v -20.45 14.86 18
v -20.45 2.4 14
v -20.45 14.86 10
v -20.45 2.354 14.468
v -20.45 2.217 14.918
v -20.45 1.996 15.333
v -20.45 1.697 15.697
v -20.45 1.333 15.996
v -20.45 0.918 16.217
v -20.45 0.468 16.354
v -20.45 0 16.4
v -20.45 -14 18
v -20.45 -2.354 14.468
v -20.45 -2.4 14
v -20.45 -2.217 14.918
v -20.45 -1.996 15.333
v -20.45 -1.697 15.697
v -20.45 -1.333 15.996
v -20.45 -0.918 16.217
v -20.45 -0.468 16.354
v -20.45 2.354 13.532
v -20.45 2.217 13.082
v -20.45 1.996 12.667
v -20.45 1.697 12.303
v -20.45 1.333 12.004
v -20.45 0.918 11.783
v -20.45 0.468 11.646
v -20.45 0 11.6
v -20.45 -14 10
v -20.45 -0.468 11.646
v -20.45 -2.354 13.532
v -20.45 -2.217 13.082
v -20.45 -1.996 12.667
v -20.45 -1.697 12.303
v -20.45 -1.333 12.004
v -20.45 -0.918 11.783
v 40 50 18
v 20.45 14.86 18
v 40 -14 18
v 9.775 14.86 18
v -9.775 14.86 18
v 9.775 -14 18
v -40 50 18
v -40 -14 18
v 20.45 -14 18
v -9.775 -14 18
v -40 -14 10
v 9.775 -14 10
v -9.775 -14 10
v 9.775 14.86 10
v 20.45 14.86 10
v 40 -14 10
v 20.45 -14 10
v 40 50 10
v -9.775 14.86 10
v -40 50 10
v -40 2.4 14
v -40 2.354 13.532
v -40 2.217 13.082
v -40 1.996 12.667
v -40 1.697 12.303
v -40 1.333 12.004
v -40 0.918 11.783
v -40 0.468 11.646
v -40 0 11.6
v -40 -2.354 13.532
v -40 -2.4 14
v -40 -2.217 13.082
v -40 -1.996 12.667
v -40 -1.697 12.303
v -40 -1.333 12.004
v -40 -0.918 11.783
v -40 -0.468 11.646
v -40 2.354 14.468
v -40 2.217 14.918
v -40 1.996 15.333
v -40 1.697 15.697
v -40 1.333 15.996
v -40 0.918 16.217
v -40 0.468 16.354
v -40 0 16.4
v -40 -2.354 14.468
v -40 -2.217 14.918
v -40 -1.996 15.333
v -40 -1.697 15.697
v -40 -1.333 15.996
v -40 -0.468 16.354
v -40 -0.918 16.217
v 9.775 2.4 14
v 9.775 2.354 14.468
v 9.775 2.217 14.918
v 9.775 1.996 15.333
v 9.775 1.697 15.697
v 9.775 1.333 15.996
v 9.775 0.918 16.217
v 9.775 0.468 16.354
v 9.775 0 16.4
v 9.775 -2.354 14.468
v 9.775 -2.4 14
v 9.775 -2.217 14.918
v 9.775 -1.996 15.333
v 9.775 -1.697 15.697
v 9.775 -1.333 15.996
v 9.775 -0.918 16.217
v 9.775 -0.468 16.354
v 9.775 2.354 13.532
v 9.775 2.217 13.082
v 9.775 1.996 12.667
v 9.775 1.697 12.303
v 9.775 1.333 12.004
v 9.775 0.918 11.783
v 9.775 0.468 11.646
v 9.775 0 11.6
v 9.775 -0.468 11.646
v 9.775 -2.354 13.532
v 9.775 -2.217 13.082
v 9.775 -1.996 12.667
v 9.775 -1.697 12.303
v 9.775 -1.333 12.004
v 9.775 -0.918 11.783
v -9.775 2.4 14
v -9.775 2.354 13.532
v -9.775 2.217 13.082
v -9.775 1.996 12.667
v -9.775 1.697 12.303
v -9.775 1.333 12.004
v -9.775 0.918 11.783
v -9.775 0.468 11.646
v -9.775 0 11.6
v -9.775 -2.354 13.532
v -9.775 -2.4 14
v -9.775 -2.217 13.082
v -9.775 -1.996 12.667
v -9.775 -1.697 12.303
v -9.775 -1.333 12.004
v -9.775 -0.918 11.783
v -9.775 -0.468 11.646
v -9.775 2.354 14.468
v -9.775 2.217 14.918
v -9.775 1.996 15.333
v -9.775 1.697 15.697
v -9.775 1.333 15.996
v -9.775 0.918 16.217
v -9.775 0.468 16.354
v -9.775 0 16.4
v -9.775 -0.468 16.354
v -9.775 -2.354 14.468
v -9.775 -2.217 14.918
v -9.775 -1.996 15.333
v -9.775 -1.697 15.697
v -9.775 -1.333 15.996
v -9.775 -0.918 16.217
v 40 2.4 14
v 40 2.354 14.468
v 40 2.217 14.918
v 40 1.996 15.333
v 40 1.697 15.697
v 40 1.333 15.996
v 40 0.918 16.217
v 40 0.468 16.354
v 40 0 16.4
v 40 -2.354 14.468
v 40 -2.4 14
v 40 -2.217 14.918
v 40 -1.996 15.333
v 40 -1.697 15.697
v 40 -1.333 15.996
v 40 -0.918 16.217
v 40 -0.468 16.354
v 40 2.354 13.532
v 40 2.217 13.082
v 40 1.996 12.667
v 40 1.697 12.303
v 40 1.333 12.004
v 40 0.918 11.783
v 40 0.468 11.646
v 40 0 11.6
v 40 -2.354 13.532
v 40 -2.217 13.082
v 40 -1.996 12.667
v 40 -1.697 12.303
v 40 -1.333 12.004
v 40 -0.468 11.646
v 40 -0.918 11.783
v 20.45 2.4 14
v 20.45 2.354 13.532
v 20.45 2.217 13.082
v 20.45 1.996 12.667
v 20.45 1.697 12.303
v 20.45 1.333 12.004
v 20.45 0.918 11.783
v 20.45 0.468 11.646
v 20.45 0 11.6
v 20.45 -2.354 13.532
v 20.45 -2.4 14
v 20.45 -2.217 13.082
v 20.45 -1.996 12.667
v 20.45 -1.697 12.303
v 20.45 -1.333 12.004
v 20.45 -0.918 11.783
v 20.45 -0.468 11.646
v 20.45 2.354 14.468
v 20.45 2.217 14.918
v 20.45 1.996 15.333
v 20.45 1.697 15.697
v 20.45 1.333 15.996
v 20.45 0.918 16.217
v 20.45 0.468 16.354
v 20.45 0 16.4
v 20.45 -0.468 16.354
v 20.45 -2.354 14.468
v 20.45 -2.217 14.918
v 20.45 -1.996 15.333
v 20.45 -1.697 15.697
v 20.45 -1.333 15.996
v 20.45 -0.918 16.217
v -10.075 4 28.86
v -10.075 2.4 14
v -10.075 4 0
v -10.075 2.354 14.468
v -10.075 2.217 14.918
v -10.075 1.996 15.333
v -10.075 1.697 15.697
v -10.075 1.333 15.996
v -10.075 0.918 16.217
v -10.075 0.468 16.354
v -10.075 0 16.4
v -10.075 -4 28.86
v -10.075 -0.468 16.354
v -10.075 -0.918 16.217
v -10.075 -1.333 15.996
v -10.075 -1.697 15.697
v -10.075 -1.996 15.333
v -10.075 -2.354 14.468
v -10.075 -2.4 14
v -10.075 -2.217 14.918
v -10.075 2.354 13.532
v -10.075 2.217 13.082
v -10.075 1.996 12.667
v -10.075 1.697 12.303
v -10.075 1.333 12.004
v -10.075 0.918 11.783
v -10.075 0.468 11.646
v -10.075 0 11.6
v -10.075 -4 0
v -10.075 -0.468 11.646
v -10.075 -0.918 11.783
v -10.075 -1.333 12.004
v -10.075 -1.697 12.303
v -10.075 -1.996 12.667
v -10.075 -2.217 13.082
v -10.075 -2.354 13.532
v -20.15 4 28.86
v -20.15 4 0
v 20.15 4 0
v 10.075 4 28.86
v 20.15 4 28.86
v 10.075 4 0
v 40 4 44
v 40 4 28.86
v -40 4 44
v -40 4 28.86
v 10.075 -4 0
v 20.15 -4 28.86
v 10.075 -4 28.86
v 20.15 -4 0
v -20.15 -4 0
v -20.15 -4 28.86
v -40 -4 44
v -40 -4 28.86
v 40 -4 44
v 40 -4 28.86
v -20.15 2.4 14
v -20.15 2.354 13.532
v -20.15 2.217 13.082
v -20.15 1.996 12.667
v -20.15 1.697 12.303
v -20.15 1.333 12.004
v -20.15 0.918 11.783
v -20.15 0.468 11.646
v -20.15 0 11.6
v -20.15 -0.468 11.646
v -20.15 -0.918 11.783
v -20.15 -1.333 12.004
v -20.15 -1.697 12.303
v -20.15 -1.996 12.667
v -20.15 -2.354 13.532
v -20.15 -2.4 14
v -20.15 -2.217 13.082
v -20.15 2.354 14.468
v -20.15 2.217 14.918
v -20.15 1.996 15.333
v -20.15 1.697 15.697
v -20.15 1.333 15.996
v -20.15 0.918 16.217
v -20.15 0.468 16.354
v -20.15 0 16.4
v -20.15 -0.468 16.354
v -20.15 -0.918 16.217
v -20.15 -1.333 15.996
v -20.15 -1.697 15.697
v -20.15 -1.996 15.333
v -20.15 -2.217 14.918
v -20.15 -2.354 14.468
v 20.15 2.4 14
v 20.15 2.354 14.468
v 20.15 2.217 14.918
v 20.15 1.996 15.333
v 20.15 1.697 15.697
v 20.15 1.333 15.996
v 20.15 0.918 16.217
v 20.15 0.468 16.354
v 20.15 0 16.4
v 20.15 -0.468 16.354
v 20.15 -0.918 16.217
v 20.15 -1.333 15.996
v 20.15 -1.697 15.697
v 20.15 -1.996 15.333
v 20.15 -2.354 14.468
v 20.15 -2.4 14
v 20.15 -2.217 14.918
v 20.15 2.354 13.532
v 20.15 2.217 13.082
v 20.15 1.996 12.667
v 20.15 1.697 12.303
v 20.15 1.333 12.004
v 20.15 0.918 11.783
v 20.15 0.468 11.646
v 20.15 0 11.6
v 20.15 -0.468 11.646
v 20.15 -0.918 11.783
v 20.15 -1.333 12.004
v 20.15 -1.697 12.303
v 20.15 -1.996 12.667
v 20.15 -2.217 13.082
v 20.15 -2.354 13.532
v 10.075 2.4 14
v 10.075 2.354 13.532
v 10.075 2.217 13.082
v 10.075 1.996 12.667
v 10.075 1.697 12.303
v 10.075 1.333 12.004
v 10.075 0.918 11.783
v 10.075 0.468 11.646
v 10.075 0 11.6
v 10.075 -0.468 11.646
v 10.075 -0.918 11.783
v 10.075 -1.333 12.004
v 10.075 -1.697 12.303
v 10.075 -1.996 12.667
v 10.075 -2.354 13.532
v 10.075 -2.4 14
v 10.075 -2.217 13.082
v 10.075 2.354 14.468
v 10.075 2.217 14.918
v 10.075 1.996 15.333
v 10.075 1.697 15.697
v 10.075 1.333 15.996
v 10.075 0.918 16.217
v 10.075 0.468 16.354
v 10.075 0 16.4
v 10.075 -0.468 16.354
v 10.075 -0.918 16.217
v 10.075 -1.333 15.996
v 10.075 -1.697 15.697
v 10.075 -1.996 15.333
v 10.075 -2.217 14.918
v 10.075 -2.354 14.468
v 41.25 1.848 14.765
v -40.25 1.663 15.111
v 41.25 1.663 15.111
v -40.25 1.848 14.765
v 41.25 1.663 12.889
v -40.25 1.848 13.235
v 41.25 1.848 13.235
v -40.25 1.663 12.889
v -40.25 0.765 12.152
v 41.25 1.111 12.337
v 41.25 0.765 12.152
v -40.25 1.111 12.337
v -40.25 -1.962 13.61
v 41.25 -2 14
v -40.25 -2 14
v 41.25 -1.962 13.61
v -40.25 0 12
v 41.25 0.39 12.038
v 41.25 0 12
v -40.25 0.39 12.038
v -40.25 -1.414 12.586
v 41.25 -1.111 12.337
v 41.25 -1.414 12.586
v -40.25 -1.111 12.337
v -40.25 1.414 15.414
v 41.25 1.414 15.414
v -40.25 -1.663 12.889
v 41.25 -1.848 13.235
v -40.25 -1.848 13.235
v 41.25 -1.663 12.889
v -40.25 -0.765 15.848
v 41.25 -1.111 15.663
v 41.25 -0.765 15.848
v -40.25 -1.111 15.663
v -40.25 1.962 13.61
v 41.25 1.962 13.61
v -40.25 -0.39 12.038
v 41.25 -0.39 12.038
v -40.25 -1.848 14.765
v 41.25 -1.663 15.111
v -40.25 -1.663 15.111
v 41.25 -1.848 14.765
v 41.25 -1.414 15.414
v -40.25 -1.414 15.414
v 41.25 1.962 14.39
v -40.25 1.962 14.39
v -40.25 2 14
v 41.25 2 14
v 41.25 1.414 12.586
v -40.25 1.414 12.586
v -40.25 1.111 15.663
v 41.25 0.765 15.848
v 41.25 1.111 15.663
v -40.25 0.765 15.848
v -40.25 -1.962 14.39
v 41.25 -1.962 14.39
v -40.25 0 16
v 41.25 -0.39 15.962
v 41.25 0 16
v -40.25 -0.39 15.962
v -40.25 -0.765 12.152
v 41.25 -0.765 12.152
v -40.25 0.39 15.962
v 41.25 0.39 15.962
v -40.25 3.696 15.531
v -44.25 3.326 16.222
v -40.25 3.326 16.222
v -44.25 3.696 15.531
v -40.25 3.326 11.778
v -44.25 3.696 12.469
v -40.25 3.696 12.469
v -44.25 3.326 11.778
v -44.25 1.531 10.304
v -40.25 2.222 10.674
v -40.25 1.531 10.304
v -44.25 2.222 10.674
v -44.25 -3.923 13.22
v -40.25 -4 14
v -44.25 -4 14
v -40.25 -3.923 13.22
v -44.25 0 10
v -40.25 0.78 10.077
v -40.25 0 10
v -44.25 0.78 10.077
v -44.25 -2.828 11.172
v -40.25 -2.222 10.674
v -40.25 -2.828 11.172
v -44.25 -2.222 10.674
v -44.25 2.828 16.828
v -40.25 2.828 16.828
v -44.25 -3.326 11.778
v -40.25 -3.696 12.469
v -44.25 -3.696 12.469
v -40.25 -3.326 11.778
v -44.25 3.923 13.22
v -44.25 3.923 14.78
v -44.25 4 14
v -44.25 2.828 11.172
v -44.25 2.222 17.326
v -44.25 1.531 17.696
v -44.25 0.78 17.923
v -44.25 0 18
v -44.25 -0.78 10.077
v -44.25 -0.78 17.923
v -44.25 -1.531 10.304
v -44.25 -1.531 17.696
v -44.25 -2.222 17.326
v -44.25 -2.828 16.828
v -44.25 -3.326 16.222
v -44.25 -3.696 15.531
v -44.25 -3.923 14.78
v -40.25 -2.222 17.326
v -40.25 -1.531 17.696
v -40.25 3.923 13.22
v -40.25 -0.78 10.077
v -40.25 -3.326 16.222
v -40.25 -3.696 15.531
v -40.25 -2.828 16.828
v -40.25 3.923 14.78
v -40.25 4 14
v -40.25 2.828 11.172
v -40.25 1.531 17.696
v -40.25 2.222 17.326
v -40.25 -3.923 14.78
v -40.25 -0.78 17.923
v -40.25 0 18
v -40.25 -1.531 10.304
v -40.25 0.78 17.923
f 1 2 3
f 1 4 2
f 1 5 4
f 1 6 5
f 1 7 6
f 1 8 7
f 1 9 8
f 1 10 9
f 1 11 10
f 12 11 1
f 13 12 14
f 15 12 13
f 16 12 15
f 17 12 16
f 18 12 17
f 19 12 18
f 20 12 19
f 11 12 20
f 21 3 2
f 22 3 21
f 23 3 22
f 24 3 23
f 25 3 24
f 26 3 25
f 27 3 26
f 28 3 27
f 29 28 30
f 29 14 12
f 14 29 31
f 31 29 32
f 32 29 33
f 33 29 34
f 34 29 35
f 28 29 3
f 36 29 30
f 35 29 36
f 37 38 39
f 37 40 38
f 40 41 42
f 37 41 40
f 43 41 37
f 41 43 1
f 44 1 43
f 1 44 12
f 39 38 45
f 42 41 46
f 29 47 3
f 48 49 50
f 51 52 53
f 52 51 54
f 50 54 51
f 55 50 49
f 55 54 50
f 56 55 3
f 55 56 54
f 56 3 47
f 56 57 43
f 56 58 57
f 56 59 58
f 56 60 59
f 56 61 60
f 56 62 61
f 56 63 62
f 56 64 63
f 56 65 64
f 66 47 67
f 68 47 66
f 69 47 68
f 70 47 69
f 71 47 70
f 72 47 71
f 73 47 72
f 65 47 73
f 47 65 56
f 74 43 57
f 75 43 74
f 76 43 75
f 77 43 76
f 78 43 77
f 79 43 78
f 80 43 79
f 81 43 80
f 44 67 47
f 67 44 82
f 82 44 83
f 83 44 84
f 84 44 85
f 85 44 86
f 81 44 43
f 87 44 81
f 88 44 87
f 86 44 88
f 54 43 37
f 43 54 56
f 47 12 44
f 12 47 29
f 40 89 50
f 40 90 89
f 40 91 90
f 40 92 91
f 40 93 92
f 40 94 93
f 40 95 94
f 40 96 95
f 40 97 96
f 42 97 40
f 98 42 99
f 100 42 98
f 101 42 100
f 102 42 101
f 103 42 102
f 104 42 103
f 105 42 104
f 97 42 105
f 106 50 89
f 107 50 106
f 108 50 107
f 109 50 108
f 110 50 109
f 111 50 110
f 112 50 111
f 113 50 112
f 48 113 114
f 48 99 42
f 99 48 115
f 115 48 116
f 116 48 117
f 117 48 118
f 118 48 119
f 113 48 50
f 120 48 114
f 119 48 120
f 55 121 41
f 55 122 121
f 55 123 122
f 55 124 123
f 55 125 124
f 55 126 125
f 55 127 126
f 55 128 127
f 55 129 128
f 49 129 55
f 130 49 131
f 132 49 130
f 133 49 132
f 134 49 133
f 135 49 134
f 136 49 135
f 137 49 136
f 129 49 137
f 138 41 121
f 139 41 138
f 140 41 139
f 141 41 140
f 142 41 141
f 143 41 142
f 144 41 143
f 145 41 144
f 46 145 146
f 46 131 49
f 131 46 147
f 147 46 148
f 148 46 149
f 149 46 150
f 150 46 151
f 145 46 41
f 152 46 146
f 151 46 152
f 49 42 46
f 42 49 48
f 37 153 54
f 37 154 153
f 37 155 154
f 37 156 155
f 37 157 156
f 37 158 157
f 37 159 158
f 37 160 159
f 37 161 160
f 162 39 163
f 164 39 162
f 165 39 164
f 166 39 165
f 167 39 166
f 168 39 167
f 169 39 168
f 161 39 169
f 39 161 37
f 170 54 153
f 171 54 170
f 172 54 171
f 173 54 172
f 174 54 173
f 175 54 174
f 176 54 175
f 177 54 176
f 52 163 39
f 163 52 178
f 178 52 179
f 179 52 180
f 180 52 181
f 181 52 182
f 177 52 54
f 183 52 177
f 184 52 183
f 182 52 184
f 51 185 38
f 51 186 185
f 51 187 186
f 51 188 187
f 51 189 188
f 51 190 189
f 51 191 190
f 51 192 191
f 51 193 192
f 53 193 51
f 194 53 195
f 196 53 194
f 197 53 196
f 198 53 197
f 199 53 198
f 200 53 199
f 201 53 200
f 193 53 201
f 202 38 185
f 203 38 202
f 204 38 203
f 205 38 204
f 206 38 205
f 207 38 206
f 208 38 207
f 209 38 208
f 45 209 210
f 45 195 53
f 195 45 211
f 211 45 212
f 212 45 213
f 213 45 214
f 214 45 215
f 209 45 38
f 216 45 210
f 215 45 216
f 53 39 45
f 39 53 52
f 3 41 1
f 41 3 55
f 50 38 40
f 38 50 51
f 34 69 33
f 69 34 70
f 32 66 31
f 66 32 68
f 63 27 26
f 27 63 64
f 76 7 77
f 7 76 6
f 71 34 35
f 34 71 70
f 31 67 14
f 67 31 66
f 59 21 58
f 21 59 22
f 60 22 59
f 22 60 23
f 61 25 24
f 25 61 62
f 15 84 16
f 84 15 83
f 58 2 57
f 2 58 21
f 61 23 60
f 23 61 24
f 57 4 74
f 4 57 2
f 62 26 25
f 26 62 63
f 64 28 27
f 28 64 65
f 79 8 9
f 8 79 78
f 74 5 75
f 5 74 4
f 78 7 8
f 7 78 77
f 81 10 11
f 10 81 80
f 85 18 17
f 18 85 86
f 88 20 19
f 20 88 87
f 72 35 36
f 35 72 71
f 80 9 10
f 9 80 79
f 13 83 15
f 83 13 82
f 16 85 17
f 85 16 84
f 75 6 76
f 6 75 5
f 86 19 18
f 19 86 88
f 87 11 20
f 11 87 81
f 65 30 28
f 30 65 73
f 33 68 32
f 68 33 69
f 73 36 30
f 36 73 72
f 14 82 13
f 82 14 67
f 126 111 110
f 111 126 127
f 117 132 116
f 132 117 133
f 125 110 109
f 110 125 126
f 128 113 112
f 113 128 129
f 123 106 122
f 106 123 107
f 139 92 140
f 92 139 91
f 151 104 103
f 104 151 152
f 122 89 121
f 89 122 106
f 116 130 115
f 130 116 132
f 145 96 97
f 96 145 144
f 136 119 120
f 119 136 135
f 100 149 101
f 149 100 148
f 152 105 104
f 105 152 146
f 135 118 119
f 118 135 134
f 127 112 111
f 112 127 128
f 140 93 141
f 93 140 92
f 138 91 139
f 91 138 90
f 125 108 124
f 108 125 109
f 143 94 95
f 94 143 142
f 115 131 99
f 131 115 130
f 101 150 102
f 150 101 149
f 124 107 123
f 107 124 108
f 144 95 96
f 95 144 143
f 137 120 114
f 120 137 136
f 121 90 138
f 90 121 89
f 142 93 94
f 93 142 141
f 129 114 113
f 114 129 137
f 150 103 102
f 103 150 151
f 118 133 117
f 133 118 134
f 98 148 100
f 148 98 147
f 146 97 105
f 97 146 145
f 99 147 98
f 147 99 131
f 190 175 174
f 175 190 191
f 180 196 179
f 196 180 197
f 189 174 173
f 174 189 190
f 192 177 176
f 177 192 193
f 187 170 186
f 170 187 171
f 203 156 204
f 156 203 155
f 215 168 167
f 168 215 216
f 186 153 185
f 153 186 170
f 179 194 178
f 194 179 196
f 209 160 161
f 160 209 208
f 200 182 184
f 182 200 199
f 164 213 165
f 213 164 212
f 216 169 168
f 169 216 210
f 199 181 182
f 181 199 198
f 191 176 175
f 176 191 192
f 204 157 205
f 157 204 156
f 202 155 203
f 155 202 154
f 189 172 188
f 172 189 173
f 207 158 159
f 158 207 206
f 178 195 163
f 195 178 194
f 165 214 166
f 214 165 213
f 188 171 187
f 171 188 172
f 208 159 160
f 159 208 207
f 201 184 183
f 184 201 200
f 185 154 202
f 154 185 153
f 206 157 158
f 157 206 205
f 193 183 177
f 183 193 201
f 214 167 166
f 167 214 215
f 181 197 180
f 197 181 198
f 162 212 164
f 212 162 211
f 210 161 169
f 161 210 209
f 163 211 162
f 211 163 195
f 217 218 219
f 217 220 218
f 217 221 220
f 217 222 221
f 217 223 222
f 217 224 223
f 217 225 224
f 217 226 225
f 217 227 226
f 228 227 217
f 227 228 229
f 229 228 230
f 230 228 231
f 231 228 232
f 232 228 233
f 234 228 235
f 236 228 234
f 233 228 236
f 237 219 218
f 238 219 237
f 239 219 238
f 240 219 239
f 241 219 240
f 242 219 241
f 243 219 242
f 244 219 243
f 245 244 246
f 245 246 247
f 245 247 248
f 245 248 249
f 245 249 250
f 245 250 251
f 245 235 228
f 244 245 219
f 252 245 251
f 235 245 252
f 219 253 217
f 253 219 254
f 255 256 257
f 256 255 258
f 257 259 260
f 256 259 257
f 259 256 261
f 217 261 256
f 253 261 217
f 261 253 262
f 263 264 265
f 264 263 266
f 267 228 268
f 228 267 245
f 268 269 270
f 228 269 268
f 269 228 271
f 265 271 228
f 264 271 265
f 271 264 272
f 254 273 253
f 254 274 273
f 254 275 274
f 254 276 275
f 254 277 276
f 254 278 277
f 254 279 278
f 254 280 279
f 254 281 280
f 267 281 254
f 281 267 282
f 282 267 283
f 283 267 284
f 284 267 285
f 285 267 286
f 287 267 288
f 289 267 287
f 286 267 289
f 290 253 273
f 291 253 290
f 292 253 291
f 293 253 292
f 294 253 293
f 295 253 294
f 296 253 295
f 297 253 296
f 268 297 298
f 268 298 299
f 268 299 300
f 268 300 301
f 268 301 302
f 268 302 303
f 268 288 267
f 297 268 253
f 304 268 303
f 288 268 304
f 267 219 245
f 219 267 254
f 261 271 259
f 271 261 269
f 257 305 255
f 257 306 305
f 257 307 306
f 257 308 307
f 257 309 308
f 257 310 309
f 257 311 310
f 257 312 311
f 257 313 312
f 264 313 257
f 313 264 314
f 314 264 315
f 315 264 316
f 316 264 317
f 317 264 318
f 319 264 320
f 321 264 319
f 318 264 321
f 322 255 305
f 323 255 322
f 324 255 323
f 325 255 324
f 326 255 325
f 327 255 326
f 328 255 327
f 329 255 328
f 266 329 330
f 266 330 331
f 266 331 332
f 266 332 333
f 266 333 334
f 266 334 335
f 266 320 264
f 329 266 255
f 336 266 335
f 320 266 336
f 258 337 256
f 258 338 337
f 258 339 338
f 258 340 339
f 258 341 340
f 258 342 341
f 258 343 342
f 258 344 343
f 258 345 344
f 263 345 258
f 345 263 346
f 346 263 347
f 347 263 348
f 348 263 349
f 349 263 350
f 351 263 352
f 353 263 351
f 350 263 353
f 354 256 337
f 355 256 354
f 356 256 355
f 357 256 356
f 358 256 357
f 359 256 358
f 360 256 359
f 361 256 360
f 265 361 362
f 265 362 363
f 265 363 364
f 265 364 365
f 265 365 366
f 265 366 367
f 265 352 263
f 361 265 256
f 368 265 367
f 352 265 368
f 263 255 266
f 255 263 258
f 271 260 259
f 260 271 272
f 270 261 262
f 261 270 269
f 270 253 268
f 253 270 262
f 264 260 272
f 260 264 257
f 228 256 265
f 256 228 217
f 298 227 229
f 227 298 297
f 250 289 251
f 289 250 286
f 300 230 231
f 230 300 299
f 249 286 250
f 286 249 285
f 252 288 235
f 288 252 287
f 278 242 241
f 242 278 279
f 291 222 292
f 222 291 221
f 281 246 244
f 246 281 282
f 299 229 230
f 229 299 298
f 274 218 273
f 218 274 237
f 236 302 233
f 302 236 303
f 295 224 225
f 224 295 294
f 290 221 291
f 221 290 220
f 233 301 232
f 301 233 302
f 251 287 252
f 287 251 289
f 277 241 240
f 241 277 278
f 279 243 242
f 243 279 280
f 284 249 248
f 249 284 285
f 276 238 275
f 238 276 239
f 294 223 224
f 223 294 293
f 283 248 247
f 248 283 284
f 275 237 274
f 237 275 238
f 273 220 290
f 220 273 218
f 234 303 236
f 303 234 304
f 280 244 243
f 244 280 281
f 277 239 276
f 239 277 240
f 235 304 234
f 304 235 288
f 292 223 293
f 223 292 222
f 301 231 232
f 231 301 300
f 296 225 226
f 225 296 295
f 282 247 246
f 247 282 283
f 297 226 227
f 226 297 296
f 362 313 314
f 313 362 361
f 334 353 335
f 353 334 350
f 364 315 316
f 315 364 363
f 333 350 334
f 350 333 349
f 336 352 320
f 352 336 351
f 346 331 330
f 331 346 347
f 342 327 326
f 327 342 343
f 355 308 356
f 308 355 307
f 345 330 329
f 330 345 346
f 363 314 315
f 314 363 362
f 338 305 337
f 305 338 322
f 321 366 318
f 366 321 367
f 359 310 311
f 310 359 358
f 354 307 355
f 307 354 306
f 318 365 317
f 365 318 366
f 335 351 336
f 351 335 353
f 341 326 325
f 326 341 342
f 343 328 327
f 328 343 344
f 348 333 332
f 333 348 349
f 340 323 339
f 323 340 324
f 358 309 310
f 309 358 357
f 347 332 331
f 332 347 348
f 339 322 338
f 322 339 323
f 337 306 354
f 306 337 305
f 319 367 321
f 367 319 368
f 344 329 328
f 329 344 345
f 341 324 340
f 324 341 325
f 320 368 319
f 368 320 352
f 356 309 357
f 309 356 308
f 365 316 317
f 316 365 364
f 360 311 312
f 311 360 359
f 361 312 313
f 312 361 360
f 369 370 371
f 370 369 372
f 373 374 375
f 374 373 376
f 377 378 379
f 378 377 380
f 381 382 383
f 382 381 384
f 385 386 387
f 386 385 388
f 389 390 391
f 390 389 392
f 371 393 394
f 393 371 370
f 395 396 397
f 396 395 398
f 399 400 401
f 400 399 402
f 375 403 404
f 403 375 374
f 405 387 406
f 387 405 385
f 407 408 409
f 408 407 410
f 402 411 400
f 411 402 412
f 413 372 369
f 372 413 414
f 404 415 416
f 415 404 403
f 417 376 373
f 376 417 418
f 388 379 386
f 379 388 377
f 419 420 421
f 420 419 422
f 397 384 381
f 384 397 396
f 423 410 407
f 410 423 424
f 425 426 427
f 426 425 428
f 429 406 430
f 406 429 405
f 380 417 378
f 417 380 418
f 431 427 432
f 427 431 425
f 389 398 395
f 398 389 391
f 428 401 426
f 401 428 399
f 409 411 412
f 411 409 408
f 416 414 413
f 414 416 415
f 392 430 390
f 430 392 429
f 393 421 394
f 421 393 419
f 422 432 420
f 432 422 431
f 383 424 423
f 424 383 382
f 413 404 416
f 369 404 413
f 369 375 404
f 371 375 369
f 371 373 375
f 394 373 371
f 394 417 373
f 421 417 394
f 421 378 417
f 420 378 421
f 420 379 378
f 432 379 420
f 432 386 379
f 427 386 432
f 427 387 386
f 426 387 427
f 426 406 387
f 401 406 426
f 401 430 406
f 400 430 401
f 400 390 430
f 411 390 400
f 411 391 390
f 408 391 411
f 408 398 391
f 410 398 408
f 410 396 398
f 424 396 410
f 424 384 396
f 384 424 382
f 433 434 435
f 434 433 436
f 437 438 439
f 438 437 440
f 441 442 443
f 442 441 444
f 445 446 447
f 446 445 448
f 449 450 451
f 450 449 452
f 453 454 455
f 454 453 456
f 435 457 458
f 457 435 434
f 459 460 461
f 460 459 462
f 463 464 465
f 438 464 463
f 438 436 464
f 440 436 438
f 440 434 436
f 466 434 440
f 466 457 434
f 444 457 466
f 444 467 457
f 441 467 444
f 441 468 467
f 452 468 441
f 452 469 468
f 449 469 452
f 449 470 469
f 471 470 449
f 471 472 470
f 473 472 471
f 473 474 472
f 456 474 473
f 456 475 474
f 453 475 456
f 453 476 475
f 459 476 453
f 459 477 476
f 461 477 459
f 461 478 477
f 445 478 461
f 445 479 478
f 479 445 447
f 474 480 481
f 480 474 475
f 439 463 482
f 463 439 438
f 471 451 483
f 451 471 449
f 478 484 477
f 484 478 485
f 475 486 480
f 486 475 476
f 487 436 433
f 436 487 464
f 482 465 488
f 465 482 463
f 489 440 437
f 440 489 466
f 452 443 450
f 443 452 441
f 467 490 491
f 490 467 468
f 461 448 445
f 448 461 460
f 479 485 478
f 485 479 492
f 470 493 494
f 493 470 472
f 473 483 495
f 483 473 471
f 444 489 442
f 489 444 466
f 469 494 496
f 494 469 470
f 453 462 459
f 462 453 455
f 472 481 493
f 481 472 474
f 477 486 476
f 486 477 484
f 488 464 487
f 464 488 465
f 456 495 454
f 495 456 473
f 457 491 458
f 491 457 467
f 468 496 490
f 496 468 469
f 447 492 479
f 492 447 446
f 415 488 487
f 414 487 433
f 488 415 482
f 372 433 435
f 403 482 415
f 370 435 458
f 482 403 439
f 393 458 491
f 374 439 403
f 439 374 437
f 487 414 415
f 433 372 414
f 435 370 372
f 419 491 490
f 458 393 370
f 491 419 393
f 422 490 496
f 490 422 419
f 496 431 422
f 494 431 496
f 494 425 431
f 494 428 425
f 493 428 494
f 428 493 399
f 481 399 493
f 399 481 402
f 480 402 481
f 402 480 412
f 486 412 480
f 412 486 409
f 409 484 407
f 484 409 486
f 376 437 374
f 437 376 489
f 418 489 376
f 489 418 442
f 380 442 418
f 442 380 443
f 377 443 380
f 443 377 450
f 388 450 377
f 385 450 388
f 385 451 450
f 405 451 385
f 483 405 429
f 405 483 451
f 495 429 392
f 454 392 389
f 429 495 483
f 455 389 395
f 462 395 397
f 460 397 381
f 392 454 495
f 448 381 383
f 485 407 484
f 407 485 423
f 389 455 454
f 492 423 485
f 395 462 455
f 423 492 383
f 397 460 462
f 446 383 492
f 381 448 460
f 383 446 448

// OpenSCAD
$fn = 32;

// ------------------------------------------------------------------------
// Butt hinge: hinge 80 mm, leaf swung 270 deg
// Every part is its own module, assembly() places every instance.
// ------------------------------------------------------------------------

// --- part 1 ---
module hinge_base() {
  difference() {
    union() {
      translate([-40, -14, -4]) cube([19.55, 64, 8]);
      translate([-9.775, -14, -4]) cube([19.55, 64, 8]);
      translate([20.45, -14, -4]) cube([19.55, 64, 8]);
      translate([-40, 14.86, -4]) cube([80, 35.14, 8]);
    }
    translate([-30.225, 0, 0]) rotate([0, 90, 0]) cylinder(h = 21.55, d = 4.8, center = true);
    translate([0, 0, 0]) rotate([0, 90, 0]) cylinder(h = 21.55, d = 4.8, center = true);
    translate([30.225, 0, 0]) rotate([0, 90, 0]) cylinder(h = 21.55, d = 4.8, center = true);
  }
}

// --- part 2 ---
module hinge_mover() {
  difference() {
    union() {
      translate([-20.15, -30, -4]) cube([10.075, 44, 8]);
      translate([10.075, -30, -4]) cube([10.075, 44, 8]);
      translate([-40, -30, -4]) cube([80, 15.14, 8]);
    }
    translate([-15.113, 0, 0]) rotate([0, 90, 0]) cylinder(h = 12.075, d = 4.8, center = true);
    translate([15.113, 0, 0]) rotate([0, 90, 0]) cylinder(h = 12.075, d = 4.8, center = true);
  }
}

// --- part 3 ---
module hinge_pin() {
  rotate([0, 90, 0]) cylinder(h = 82.5, d = 4, center = true);
  translate([-44.25, 0, 0]) rotate([0, 90, 0]) cylinder(h = 4, d = 8);
}

// --- assembly ---
module assembly() {
  color([0.80, 0.24, 0.20]) translate([0, 0, 14]) rotate([0, 0, 0]) hinge_base();
  color([0.20, 0.45, 0.75]) translate([0, 0, 14]) rotate([270, 0, 0]) hinge_mover();
  color([0.25, 0.62, 0.32]) translate([0, 0, 14]) rotate([0, 0, 0]) hinge_pin();
}

assembly();
